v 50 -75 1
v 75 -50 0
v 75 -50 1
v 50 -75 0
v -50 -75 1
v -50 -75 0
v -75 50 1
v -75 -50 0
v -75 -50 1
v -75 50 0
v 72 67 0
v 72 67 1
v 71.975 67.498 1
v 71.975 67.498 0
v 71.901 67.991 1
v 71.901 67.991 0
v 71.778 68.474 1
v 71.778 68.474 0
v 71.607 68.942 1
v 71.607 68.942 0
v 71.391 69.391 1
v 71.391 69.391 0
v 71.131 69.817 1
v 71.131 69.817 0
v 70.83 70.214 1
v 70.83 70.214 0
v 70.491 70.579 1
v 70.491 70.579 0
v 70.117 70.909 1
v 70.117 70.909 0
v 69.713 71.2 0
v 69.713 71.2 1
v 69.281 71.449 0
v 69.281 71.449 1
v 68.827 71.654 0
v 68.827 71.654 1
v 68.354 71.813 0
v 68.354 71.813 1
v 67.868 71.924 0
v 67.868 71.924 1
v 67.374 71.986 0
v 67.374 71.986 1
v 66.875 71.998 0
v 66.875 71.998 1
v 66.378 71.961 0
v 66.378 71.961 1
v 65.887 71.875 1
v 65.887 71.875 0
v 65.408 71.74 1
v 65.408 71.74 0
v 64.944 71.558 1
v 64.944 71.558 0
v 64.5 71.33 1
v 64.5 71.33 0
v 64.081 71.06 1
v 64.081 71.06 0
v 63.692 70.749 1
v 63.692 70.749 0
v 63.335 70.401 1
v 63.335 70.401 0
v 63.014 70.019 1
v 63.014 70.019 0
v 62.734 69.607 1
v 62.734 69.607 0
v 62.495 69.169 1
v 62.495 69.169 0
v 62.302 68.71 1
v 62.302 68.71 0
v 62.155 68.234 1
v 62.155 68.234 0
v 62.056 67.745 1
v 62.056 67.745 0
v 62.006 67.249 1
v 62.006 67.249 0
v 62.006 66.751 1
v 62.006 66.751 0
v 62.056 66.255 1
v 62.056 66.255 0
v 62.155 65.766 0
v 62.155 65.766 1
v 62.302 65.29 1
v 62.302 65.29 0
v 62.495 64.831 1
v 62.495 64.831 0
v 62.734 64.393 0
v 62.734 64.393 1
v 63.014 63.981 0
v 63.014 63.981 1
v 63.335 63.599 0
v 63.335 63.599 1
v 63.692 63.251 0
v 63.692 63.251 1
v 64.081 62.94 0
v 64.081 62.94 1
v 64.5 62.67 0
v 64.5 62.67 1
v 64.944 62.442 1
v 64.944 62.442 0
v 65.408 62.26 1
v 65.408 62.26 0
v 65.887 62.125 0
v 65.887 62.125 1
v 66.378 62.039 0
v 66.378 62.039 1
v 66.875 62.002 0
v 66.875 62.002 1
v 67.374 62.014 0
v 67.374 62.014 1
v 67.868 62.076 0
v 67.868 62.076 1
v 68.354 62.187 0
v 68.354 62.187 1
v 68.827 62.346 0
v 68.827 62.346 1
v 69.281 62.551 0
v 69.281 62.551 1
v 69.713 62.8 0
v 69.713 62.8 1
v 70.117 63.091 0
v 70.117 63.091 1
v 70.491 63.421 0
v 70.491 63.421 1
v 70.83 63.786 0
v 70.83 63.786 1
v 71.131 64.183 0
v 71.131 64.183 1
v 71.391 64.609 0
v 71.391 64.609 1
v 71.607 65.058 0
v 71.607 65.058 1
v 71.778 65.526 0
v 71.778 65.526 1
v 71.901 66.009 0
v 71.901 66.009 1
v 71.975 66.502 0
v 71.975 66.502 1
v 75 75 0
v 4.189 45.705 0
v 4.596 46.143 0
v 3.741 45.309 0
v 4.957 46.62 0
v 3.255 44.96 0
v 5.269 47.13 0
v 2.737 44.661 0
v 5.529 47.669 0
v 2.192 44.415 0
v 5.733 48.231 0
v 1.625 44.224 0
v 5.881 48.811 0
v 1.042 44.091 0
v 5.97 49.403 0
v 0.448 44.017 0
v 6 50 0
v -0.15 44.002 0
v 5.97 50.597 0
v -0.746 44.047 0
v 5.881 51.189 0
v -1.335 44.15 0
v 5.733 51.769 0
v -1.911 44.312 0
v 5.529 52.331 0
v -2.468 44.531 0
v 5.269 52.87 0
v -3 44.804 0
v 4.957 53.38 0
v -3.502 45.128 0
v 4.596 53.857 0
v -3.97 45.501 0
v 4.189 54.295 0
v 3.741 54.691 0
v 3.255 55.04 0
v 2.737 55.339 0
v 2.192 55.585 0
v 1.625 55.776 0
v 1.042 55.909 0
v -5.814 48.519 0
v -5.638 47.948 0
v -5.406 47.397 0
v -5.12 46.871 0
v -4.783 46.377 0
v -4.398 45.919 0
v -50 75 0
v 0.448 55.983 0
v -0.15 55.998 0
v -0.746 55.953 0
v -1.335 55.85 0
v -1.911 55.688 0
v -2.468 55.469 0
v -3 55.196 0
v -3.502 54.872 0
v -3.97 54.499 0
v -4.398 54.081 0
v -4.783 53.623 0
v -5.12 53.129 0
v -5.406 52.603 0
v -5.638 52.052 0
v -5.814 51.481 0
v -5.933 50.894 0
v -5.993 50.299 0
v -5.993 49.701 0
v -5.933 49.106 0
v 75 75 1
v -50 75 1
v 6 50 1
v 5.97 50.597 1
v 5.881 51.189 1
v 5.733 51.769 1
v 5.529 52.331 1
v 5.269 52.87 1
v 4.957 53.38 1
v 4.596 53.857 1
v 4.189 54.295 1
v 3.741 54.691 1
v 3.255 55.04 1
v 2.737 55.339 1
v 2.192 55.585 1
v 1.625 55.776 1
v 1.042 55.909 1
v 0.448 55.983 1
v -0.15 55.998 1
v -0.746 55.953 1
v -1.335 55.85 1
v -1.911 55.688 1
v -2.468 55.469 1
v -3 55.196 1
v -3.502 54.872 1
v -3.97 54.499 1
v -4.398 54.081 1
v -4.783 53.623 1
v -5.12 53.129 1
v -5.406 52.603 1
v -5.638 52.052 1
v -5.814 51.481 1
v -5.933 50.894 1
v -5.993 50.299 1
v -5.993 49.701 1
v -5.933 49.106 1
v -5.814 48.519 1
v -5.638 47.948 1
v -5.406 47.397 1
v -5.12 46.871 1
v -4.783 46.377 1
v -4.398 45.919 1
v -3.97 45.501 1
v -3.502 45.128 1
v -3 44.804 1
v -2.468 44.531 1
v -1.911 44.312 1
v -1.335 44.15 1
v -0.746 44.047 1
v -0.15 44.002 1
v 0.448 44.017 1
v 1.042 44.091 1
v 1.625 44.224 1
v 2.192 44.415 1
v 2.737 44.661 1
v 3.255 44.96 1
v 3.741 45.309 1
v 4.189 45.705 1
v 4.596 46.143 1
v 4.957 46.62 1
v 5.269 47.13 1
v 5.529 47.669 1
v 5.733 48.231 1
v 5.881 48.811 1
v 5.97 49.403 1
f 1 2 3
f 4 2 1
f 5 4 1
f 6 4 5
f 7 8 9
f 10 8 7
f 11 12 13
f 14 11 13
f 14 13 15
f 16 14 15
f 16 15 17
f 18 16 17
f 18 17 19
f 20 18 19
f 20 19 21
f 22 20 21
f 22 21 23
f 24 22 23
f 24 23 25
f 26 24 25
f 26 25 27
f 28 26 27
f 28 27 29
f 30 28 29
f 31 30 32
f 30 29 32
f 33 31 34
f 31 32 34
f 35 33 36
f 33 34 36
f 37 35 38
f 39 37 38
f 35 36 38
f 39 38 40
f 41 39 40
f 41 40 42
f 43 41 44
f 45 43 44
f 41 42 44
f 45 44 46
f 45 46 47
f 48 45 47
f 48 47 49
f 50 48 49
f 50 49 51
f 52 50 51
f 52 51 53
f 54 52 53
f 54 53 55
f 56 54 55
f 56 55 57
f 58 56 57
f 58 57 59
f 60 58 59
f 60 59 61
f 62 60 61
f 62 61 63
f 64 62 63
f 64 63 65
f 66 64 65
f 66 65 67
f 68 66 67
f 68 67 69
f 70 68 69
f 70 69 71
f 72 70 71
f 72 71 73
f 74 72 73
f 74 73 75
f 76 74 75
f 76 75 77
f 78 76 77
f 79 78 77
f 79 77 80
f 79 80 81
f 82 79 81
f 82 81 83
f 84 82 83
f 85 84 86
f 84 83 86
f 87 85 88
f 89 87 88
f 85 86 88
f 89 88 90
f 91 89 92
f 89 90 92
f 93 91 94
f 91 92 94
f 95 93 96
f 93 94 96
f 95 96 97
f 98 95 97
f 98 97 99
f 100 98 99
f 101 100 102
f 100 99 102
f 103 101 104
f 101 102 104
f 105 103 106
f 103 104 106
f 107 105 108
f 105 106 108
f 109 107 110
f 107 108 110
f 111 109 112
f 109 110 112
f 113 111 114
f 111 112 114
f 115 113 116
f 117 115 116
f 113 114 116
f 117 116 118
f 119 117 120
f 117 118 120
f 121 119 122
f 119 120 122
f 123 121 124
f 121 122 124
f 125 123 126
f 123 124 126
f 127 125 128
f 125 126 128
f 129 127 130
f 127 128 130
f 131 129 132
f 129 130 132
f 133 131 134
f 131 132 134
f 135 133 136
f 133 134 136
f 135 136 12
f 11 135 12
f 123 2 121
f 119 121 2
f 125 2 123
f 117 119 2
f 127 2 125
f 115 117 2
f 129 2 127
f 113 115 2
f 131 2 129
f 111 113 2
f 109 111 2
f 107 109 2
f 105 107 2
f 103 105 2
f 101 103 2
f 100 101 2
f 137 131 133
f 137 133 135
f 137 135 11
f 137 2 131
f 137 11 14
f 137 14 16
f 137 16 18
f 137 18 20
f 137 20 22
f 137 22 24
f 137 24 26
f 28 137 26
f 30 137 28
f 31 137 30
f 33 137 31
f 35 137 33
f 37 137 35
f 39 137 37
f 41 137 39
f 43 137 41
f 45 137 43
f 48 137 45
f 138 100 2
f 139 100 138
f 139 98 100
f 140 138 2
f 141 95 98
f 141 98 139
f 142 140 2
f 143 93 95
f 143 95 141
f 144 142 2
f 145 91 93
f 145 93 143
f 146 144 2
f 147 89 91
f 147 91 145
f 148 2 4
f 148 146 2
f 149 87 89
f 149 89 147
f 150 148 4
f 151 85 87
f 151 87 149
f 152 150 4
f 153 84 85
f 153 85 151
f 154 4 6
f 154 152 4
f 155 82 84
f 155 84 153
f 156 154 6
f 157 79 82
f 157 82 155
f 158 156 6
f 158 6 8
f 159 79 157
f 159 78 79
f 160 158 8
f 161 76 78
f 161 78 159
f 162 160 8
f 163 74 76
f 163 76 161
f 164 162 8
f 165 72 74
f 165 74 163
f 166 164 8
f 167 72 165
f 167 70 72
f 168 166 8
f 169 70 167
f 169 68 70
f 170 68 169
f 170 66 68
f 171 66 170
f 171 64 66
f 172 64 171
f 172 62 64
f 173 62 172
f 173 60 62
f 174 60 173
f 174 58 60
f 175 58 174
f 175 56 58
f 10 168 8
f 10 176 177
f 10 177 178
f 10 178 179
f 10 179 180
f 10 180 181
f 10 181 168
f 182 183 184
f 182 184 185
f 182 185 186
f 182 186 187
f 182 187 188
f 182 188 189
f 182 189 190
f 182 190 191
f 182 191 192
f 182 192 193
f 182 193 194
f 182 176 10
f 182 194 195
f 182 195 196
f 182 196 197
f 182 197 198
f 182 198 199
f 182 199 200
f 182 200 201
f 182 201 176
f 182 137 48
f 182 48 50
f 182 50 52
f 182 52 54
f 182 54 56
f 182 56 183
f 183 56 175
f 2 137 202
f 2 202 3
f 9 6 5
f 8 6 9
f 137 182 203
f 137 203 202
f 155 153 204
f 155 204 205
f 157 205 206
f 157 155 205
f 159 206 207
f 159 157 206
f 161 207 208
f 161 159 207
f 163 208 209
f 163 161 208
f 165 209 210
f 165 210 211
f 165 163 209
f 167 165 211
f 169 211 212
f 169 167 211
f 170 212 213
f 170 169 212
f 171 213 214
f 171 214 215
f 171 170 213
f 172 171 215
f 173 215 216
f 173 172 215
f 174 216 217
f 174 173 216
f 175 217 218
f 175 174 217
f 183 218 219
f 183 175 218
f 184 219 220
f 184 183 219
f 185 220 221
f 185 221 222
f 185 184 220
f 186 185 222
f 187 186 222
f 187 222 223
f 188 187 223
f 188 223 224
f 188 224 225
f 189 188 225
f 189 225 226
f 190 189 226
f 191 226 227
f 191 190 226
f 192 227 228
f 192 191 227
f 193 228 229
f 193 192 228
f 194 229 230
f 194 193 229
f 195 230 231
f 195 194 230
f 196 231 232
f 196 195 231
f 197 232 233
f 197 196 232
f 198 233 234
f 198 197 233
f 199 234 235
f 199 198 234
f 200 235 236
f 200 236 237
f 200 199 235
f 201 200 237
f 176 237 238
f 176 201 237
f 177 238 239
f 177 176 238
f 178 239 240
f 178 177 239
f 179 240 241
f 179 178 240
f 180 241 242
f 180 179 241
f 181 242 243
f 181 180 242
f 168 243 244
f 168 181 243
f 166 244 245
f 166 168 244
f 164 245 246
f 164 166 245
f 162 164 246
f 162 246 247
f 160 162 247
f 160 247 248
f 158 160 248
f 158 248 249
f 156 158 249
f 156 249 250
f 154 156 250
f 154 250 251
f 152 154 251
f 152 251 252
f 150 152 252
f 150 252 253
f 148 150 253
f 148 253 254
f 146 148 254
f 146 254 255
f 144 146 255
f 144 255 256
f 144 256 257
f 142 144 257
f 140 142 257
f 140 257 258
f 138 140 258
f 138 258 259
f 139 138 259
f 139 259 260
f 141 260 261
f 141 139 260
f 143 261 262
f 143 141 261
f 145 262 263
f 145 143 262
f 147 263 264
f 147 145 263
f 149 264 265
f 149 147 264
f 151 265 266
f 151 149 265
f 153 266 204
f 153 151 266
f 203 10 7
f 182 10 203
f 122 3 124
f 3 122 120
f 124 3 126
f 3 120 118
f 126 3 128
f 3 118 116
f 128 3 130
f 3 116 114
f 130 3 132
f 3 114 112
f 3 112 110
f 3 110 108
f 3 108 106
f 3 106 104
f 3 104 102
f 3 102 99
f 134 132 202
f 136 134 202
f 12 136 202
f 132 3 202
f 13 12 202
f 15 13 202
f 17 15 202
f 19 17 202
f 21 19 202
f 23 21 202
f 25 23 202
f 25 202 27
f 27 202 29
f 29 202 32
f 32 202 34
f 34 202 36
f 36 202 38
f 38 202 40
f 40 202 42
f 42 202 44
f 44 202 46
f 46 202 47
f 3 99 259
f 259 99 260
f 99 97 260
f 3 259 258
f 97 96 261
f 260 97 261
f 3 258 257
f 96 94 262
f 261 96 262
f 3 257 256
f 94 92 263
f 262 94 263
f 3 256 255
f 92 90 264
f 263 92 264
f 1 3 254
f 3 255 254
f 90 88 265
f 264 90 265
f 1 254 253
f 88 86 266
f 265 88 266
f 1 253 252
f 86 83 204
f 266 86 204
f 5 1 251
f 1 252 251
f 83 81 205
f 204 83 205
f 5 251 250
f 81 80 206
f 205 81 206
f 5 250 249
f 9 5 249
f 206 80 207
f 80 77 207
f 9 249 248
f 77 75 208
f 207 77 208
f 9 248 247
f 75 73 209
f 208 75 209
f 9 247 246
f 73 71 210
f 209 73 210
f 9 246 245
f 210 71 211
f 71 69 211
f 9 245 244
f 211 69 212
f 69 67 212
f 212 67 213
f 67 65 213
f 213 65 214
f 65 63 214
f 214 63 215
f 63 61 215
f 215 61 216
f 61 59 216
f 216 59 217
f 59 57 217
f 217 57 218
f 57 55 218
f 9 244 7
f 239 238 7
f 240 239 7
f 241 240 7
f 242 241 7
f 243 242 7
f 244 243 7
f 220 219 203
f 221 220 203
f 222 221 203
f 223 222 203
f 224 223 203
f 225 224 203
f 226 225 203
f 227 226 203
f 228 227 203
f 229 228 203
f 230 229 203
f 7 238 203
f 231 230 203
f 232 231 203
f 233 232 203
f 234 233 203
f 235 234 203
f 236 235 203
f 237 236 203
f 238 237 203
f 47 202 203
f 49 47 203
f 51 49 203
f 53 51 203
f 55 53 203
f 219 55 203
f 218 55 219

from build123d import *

# Parameters (mm, degrees)
SKETCH1_R           = 6
BOSS_EXTRUDE1_DEPTH = 1
SKETCH2_R           = 5
CUT_EXTRUDE1_DEPTH  = 10


with BuildPart() as part:
    # Sketch1 → Boss-Extrude1 (new body)
    with BuildSketch(Plane.XY):
        Polygon((-75, 50), (-50, 75), (75, 75), (75, -50), (50, -75), (-50, -75), (-75, -50), align=None)
        with Locations((0, 50)):
            Circle(SKETCH1_R, mode=Mode.SUBTRACT)
    extrude(amount=BOSS_EXTRUDE1_DEPTH)

    # Sketch2 → Cut-Extrude1 (cut)
    with BuildSketch(Plane.XY.offset(1)):
        with Locations((67, 67)):
            Circle(SKETCH2_R)
    extrude(amount=-CUT_EXTRUDE1_DEPTH, mode=Mode.SUBTRACT)


solid = part.part
